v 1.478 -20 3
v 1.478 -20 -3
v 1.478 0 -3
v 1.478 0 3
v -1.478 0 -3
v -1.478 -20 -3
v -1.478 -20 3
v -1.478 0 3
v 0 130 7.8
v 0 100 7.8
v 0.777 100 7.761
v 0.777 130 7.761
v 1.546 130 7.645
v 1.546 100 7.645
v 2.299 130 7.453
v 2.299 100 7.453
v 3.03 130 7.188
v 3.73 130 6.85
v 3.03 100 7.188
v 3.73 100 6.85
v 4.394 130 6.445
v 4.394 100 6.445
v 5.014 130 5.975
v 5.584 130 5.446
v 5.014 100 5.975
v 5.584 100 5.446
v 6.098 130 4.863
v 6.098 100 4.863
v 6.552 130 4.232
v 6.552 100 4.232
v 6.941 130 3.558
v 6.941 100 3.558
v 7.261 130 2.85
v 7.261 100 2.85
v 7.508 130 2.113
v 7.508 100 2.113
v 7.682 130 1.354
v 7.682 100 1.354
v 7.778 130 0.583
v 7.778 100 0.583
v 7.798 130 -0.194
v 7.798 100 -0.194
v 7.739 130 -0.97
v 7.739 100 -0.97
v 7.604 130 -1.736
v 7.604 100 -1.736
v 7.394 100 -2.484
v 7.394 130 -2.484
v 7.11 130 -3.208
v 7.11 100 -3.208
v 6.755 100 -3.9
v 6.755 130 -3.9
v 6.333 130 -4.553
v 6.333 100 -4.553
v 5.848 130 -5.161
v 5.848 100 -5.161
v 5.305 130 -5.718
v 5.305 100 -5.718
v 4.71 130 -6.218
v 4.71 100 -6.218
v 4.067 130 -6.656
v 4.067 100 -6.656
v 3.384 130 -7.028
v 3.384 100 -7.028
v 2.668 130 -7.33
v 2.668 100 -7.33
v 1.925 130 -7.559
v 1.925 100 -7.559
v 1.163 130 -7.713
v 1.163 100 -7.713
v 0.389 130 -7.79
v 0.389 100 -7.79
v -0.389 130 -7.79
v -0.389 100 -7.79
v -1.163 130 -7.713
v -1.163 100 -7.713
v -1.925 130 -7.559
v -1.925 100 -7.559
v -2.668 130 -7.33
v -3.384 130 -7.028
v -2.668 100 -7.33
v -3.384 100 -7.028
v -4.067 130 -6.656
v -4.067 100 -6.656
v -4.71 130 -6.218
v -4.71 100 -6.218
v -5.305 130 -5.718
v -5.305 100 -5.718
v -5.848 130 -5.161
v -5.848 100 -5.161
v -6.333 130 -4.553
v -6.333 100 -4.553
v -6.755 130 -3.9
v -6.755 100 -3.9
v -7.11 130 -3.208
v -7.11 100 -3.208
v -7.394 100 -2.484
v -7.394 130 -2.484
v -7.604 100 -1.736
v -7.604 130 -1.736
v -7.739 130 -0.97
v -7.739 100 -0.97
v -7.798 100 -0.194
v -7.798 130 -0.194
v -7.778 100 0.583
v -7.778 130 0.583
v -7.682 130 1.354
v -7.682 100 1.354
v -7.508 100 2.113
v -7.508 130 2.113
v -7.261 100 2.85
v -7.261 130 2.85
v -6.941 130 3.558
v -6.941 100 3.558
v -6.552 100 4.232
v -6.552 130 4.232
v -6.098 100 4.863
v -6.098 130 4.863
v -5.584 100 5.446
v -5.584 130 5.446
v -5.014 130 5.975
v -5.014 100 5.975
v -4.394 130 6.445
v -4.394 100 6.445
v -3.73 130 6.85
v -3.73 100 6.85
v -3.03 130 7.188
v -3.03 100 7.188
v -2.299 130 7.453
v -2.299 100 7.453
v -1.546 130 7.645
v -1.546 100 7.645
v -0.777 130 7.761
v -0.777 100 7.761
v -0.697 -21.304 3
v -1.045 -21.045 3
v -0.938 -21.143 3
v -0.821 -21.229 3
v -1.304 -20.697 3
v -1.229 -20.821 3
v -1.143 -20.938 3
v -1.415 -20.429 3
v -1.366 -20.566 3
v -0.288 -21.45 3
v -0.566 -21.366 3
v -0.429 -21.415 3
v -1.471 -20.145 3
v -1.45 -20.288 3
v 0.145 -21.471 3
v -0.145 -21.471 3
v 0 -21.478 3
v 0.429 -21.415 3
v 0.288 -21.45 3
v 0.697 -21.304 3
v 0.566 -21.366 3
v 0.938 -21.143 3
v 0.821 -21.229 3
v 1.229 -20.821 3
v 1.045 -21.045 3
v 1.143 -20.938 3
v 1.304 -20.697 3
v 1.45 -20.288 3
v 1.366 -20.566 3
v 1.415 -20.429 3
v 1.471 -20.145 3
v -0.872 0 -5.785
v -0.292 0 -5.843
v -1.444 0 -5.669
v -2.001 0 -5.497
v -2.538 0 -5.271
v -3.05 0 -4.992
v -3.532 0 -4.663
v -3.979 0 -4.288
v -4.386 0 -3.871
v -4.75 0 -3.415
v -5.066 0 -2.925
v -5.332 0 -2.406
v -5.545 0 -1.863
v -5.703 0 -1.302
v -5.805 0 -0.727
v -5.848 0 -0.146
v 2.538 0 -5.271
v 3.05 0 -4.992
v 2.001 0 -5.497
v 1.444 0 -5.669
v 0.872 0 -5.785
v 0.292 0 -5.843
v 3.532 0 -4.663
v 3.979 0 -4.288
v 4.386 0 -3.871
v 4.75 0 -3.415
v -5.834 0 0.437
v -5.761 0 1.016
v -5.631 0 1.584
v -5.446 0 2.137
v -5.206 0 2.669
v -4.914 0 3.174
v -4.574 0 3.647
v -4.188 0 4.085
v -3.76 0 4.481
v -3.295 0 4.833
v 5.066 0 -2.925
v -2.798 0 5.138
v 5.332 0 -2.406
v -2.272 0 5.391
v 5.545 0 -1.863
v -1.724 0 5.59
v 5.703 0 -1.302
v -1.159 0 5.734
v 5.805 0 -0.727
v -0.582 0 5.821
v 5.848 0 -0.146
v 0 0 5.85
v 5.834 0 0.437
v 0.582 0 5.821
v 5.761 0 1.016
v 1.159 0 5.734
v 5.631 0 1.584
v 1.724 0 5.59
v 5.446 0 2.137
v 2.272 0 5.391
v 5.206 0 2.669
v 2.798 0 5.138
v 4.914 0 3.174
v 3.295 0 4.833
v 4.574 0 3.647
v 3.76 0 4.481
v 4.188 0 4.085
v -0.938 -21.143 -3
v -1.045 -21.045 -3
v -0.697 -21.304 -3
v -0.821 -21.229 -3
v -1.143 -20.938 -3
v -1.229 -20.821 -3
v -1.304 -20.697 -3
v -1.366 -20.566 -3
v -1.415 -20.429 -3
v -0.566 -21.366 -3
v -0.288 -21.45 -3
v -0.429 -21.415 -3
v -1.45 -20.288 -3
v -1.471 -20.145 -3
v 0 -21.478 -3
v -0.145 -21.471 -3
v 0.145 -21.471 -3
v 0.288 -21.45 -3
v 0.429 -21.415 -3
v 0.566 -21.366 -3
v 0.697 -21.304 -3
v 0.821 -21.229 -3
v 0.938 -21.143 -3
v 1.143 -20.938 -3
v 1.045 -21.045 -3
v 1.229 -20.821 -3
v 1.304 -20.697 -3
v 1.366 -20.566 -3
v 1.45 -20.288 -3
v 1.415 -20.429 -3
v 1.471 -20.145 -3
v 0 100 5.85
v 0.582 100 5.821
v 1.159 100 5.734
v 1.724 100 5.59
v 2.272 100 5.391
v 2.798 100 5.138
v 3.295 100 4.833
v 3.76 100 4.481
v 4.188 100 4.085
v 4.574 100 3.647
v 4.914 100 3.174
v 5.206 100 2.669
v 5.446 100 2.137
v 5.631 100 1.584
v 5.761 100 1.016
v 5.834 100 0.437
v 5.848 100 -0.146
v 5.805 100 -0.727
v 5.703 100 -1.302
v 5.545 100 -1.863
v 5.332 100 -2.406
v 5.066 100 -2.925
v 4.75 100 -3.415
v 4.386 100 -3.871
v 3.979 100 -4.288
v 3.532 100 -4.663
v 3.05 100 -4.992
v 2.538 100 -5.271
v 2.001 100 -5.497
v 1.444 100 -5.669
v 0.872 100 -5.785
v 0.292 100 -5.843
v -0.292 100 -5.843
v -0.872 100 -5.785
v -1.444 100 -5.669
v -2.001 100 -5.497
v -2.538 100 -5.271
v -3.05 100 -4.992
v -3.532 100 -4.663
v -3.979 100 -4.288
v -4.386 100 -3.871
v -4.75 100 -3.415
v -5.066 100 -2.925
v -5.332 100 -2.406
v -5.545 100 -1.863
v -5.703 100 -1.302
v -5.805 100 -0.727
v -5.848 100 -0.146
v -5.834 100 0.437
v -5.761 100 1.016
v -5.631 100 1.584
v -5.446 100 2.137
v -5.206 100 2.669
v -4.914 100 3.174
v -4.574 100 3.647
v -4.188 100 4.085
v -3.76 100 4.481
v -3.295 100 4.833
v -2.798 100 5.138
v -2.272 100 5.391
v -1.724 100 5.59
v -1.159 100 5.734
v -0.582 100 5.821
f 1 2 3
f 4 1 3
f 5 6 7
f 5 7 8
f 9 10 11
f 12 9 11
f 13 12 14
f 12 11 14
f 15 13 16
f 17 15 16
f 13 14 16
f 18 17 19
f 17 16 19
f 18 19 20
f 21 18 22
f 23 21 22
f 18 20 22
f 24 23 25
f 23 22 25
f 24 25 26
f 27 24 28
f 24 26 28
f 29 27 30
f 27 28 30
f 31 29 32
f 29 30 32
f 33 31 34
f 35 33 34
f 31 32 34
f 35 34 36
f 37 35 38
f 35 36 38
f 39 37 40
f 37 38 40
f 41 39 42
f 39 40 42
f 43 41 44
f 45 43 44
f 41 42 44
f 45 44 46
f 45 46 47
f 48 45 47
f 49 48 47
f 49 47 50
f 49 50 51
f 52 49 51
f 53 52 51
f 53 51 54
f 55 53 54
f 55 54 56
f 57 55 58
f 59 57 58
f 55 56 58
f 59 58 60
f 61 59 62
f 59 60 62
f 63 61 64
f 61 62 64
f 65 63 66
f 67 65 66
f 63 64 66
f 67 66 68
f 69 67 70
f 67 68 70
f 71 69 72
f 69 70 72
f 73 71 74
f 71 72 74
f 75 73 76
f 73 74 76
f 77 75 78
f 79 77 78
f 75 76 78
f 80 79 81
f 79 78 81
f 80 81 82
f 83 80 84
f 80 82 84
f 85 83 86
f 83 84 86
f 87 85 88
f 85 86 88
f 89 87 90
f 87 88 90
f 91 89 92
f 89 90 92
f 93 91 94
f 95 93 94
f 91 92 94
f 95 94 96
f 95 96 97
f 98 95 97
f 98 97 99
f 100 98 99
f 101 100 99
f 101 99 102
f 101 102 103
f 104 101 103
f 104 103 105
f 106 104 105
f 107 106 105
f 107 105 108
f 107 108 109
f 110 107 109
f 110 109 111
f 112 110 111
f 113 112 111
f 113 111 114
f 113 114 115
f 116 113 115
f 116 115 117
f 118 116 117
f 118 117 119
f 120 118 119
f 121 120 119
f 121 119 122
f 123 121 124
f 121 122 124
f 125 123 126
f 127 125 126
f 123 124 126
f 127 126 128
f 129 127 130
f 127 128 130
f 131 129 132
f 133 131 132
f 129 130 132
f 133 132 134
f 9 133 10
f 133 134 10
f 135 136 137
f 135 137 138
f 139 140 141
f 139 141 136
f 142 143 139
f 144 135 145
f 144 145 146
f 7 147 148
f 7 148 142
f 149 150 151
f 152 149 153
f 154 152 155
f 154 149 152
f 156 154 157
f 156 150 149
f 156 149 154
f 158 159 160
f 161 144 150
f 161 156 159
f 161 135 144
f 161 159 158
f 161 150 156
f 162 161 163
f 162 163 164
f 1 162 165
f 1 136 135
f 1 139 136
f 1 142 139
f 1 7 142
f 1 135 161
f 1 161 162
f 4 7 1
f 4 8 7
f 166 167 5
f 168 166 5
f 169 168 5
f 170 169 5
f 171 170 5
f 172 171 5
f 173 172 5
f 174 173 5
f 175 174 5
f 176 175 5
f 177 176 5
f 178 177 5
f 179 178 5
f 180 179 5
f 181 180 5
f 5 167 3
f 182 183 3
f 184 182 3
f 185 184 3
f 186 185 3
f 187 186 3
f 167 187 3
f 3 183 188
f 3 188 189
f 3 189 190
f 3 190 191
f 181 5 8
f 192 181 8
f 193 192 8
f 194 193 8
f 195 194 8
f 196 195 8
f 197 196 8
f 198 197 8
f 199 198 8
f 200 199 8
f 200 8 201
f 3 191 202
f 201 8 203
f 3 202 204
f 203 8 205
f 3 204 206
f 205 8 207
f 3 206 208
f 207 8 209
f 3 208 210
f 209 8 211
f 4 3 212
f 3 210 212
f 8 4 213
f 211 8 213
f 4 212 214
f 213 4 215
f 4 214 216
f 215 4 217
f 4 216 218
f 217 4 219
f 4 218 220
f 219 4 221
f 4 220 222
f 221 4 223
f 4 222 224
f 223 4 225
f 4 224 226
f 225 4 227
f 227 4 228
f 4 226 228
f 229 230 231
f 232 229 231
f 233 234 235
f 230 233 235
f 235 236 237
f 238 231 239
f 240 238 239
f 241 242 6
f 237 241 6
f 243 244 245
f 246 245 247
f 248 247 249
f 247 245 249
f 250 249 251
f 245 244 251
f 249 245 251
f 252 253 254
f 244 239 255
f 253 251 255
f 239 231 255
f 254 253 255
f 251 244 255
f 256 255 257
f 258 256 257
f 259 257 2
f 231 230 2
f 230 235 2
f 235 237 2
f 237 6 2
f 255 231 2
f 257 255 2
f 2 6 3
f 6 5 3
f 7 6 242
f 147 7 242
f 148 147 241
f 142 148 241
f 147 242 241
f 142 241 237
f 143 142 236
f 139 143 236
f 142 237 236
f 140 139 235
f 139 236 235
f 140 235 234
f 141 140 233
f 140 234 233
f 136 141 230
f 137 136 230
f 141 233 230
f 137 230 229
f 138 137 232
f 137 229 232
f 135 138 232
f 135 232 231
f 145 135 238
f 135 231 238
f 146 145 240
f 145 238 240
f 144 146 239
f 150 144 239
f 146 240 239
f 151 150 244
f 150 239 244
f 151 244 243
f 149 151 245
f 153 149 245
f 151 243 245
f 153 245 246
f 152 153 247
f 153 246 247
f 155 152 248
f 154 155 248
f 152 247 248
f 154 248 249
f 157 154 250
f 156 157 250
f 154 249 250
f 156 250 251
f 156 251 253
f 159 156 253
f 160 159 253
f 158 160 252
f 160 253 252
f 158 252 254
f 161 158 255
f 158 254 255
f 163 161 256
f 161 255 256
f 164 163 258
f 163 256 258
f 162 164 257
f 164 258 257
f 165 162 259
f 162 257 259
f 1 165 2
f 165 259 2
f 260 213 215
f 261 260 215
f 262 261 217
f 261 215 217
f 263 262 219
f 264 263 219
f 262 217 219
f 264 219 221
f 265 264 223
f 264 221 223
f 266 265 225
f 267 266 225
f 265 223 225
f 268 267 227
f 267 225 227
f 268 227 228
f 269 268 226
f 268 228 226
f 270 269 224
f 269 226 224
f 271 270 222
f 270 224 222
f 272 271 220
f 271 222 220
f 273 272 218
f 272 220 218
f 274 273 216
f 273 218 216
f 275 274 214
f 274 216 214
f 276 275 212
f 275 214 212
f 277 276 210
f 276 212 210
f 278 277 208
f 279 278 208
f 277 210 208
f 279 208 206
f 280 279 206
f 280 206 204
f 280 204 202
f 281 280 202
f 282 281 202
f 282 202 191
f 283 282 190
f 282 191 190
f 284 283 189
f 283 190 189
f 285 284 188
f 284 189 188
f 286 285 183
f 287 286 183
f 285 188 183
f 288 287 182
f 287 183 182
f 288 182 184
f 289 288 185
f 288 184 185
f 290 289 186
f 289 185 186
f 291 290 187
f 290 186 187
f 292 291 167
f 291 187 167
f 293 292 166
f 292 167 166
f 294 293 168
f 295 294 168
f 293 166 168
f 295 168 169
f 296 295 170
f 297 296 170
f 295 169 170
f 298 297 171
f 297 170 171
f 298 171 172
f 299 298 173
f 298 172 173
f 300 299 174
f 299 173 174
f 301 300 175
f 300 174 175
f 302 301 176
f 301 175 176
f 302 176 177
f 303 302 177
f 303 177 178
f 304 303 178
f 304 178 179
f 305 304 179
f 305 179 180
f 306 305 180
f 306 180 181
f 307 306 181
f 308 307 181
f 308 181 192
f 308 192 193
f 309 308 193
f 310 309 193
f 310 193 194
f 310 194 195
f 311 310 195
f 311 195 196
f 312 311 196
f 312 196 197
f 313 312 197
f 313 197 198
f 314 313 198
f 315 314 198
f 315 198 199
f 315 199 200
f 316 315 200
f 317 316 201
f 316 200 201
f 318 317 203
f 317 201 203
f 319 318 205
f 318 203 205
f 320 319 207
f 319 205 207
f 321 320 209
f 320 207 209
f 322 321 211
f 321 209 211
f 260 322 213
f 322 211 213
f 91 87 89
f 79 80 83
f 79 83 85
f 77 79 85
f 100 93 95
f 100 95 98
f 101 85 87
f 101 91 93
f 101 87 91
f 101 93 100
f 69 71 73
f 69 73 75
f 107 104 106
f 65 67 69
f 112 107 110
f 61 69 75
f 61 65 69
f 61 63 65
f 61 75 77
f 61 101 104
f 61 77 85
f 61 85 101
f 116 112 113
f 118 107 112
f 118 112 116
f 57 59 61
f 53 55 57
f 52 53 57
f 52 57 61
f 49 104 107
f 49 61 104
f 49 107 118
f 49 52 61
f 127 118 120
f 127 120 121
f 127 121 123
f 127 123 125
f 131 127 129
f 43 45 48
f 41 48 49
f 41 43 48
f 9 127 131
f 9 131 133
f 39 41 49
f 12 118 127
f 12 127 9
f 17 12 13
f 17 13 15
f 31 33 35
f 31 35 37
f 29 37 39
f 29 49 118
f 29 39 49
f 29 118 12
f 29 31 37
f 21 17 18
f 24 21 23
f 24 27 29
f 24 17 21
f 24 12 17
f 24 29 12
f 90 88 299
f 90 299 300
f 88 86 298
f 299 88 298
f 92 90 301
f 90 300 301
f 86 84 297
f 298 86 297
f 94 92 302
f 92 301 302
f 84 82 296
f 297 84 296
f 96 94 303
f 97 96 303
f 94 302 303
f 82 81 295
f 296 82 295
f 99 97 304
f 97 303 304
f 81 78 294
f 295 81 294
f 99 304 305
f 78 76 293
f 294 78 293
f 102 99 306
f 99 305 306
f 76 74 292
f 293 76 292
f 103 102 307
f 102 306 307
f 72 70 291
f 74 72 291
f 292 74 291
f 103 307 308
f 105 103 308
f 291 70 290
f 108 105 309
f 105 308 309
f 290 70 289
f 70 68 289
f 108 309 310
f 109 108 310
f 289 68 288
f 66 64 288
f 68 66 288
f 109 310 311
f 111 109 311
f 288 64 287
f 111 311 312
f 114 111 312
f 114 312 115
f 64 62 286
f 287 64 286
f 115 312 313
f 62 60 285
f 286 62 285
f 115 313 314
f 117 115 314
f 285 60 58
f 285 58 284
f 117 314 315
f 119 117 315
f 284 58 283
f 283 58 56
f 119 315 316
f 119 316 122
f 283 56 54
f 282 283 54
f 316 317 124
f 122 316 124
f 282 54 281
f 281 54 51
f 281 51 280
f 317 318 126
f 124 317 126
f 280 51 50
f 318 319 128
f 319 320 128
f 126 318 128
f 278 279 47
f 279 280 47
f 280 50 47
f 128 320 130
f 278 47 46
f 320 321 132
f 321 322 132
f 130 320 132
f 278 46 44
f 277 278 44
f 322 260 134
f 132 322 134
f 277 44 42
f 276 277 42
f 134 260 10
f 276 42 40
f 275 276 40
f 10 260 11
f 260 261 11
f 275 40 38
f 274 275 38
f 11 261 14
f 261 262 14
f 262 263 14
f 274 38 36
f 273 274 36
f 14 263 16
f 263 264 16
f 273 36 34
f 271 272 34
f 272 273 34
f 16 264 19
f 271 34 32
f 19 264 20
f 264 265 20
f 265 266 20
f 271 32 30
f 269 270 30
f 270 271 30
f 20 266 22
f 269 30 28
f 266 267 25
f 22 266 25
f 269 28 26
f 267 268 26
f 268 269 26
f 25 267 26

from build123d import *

# Parameters (mm, degrees)
SKETCH1_R                = 5.85
BOSS_EXTRUDE1_DEPTH      = 100
SKETCH2_R                = 7.8
BOSS_EXTRUDE2_DEPTH      = 30
BOSS_EXTRUDE3_DEPTH      = 3
BOSS_EXTRUDE3_DEPTH_BACK = 3


with BuildPart() as part:
    # Sketch1 → Boss-Extrude1 (new body)
    with BuildSketch(Plane(origin=(0, 0, 0), x_dir=(1, 0, 0), z_dir=(0, 1, 0))):
        Circle(SKETCH1_R)
    extrude(amount=BOSS_EXTRUDE1_DEPTH)

    # Sketch2 → Boss-Extrude2 (add)
    with BuildSketch(Plane(origin=(0, 100, 0), x_dir=(1, 0, 0), z_dir=(0, 1, 0))):
        Circle(SKETCH2_R)
    extrude(amount=BOSS_EXTRUDE2_DEPTH)

    # Sketch3 → Boss-Extrude3 (add, two sides: drawn at the far end of the back side and taken through both)
    with BuildSketch(Plane.XY.offset(-BOSS_EXTRUDE3_DEPTH_BACK)):
        with BuildLine():
            Line((1.478387163, -20), (1.478387163, 0))
            Line((1.478387163, 0), (-1.478387163, 0))
            Line((-1.478387163, 0), (-1.478387163, -20))
            ThreePointArc((-1.478387163, -20), (0, -21.478387163), (1.478387163, -20))
        make_face()
    extrude(amount=BOSS_EXTRUDE3_DEPTH + BOSS_EXTRUDE3_DEPTH_BACK)


solid = part.part
